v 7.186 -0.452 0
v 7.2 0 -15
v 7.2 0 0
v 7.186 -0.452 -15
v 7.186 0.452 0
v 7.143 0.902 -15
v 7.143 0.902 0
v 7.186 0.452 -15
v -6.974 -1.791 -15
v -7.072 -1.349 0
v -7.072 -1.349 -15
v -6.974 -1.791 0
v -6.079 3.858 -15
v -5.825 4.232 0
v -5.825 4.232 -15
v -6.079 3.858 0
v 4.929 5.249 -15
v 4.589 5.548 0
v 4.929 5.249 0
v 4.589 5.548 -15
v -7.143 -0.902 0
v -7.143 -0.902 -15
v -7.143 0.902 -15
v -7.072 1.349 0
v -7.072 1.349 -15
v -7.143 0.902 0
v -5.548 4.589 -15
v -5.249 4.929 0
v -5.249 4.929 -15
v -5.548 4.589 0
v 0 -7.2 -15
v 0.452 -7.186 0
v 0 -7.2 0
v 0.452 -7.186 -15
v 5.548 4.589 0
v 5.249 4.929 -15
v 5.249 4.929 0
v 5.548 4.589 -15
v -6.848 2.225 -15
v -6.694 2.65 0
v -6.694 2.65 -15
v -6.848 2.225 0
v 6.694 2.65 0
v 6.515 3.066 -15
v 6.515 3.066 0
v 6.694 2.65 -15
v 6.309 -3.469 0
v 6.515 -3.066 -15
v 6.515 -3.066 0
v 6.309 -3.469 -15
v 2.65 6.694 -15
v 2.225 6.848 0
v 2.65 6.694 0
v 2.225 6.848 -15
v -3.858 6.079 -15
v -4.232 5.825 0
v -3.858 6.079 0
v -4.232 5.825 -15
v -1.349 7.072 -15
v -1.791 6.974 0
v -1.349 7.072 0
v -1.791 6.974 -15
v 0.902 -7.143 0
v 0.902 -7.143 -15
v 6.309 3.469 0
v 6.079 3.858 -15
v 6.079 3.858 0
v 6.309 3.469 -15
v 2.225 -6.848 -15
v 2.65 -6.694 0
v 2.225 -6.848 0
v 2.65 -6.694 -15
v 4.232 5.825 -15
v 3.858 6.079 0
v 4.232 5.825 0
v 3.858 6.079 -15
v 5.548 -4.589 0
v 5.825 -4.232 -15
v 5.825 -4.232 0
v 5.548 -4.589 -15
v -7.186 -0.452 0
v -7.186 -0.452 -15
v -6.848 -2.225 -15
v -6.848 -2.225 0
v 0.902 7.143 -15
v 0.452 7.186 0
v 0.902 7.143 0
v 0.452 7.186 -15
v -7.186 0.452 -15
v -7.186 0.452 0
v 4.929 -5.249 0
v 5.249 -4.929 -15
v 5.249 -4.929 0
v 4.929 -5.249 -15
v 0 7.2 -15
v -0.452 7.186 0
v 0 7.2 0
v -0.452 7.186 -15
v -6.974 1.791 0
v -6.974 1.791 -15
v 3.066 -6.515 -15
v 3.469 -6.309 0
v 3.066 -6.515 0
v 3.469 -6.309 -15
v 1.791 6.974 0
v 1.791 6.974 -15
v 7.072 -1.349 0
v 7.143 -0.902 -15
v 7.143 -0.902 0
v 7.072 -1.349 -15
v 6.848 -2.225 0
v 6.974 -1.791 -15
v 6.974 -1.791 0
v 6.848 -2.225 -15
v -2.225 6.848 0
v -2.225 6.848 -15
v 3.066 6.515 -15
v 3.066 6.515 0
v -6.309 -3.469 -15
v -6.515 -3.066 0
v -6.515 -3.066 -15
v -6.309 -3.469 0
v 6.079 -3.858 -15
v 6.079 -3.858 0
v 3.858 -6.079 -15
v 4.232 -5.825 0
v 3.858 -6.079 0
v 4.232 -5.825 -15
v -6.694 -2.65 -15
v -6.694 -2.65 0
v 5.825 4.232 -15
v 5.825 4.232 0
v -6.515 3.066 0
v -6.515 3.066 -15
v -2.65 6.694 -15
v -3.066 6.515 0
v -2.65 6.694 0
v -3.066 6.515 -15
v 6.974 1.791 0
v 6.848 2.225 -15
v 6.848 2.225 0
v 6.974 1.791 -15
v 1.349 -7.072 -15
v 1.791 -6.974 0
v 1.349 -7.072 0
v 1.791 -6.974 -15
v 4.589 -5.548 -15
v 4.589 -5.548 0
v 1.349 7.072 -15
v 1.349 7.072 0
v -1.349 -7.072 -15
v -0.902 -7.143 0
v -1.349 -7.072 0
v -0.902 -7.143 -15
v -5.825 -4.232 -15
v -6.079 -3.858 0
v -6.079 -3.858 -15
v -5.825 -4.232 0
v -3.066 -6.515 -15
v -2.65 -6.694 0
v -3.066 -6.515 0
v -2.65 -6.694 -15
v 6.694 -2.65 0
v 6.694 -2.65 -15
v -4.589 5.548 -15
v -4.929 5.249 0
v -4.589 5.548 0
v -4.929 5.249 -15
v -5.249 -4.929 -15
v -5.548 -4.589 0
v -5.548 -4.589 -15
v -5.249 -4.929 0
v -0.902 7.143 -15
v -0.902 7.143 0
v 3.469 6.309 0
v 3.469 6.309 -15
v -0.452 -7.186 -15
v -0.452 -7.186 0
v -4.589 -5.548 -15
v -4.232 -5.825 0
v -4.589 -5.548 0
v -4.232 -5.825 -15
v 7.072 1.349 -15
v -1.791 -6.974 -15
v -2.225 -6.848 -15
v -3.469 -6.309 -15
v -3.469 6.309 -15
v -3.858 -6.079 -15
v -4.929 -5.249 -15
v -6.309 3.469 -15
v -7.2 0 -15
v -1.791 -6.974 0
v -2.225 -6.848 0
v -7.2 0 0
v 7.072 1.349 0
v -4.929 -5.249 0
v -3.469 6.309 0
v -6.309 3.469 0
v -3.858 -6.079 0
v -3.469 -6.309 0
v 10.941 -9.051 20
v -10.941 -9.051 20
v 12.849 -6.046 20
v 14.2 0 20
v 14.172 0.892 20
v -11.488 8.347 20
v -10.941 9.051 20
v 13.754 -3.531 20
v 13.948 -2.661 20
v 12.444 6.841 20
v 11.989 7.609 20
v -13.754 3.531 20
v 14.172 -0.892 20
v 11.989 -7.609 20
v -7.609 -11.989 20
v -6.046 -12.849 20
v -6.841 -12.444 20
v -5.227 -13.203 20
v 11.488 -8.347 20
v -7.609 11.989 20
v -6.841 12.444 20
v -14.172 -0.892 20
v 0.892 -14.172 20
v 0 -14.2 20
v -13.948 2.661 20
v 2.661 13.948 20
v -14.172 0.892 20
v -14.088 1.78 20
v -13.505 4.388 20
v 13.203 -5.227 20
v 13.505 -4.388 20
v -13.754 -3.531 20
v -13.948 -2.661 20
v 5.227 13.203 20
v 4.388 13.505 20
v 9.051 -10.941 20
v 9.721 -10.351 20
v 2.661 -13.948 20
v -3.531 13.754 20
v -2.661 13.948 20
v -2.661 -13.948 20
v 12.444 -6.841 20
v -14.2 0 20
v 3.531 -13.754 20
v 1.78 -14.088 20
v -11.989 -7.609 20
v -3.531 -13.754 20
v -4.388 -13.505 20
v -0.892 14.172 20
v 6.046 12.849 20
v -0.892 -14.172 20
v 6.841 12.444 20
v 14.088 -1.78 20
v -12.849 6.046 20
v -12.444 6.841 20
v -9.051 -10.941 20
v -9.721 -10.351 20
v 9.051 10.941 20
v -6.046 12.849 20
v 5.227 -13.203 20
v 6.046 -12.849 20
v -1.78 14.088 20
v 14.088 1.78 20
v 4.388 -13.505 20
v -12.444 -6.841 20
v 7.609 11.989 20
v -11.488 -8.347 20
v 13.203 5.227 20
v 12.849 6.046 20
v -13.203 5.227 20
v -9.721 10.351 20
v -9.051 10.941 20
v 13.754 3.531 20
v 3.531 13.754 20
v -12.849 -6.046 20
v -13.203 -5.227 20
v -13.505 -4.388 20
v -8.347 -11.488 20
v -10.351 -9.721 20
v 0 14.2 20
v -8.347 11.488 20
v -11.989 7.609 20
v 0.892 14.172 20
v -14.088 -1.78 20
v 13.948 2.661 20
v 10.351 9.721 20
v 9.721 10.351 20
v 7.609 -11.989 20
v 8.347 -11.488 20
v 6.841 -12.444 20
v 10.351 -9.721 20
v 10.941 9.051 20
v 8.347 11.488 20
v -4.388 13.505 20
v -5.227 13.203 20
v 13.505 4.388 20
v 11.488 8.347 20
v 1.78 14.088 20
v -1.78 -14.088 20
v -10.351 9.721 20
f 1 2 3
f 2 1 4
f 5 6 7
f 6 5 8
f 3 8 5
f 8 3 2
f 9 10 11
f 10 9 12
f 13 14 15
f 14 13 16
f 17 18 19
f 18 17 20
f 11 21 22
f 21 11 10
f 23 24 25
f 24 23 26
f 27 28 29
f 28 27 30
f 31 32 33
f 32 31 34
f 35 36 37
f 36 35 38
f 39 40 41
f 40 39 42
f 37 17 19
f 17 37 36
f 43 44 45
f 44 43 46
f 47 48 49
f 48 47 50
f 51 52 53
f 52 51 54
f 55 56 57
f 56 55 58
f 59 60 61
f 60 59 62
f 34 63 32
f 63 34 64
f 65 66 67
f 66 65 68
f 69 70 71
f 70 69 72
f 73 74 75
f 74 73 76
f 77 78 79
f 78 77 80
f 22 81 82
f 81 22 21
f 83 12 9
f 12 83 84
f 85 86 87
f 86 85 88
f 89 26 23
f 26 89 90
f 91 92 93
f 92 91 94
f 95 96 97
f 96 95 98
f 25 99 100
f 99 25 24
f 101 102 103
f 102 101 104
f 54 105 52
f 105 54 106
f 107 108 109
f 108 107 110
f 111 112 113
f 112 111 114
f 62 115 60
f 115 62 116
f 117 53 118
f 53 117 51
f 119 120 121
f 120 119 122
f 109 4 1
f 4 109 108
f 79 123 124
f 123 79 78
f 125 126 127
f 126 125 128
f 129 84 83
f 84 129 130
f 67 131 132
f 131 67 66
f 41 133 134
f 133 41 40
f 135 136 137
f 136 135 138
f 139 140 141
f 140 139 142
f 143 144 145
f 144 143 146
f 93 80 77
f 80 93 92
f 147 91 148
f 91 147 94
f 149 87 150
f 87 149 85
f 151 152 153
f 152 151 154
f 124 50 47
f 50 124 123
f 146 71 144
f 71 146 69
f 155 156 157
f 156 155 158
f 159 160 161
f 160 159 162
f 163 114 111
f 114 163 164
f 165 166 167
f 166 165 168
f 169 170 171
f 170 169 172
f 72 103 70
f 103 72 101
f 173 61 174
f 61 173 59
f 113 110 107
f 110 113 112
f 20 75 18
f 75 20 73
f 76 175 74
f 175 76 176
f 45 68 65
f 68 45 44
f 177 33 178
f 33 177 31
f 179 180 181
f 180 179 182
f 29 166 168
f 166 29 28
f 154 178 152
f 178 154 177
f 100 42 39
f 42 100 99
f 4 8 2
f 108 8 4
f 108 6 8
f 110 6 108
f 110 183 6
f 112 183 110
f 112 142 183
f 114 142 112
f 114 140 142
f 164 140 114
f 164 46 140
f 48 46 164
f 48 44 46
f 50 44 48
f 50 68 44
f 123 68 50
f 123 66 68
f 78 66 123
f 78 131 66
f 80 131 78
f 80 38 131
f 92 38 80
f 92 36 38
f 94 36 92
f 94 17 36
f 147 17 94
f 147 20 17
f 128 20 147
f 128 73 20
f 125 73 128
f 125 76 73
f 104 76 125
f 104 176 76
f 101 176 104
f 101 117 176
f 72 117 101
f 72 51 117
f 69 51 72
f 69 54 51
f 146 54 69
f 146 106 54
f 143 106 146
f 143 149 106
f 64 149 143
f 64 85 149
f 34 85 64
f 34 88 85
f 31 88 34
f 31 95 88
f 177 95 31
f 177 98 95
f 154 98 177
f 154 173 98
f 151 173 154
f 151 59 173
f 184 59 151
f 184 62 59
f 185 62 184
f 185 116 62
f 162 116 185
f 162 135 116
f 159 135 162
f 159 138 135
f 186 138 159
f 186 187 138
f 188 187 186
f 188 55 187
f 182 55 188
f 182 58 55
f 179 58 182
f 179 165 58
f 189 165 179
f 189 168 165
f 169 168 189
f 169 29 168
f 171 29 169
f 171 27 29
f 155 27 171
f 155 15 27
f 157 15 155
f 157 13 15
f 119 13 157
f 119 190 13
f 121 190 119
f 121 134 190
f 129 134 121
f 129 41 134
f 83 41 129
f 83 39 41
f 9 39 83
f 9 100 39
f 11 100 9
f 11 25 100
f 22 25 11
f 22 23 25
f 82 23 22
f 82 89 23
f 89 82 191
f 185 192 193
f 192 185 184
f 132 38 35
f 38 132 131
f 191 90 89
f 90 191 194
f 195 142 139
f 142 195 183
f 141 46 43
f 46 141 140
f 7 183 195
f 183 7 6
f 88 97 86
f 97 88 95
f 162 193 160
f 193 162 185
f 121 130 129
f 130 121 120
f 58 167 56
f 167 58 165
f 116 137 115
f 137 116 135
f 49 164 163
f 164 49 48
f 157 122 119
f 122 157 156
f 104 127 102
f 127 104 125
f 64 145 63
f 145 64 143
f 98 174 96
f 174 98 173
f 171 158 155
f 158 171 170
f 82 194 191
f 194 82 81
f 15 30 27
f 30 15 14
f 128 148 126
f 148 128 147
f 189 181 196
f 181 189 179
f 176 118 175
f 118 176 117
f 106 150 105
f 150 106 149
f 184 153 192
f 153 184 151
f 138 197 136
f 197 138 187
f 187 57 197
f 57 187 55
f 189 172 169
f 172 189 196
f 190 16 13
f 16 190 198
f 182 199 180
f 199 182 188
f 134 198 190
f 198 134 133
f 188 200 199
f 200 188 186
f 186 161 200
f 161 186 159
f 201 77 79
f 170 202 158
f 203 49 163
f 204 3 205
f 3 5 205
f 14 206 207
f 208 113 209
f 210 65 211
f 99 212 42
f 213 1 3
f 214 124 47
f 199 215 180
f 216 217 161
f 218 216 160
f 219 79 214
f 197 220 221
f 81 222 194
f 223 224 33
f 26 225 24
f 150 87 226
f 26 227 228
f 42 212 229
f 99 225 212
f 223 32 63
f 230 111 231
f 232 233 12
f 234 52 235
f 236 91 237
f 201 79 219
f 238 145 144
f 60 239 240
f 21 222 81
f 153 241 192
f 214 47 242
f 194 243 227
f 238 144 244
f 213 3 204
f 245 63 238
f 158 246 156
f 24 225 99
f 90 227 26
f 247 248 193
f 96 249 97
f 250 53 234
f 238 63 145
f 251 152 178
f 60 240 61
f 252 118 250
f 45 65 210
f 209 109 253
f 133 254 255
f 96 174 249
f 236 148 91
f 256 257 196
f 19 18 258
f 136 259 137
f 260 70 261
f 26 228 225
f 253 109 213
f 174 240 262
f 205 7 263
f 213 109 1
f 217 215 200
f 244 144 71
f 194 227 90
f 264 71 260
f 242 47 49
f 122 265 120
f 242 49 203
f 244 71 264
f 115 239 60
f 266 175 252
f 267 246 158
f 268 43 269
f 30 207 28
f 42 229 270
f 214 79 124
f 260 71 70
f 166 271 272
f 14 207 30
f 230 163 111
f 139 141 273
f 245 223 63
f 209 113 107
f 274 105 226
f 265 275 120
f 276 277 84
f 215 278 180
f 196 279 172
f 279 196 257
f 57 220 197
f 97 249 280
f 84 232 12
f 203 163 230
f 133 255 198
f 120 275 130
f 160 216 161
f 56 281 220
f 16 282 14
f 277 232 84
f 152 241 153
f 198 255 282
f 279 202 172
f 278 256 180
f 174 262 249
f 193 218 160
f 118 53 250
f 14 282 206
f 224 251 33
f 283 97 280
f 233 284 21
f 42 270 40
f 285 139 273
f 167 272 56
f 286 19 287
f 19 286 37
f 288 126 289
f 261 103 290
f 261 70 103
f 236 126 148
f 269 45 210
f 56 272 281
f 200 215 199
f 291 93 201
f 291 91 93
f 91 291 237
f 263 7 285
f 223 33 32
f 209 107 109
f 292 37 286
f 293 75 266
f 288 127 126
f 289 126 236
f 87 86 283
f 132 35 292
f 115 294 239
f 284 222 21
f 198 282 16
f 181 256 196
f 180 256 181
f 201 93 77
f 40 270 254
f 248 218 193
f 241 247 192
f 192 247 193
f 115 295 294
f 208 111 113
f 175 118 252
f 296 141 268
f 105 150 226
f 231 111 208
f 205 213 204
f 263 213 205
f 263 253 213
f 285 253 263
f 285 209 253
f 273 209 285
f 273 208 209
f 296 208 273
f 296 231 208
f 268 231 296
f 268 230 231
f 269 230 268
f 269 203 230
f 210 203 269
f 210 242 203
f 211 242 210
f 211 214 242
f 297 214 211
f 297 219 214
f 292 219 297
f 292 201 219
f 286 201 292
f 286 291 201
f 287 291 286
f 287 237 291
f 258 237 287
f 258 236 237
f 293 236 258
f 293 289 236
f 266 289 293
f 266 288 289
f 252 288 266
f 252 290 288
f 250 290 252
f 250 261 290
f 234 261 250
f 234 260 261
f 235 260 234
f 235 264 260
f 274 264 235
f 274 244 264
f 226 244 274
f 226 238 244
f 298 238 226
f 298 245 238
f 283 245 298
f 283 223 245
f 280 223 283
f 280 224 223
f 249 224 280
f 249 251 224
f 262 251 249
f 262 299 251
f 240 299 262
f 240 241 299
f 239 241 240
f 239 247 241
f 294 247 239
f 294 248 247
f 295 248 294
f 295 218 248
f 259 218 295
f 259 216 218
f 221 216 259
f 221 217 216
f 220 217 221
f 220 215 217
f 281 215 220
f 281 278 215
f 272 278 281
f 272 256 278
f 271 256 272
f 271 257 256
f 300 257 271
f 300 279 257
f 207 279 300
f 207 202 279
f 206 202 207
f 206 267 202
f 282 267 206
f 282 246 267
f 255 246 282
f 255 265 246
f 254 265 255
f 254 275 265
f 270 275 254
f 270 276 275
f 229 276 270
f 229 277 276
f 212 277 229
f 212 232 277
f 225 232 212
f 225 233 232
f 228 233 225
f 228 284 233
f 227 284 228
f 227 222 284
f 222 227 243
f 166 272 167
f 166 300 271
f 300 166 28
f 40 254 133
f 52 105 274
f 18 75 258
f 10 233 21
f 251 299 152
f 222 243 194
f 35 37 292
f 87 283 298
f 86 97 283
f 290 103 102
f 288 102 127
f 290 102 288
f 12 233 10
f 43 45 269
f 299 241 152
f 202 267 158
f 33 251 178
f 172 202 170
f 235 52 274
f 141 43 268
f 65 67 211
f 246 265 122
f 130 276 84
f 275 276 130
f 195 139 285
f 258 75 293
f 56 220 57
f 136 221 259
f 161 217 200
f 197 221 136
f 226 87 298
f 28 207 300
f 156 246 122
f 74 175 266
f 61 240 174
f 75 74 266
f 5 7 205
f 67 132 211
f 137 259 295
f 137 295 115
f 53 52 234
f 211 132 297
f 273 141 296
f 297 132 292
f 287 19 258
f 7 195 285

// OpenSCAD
wall = 1.2;
$fn=100;

translate([0,0,-15]) {
	cylinder(r=6+wall, h=15);
}

cylinder(r1=6+wall, r2=13+wall, h=20);
